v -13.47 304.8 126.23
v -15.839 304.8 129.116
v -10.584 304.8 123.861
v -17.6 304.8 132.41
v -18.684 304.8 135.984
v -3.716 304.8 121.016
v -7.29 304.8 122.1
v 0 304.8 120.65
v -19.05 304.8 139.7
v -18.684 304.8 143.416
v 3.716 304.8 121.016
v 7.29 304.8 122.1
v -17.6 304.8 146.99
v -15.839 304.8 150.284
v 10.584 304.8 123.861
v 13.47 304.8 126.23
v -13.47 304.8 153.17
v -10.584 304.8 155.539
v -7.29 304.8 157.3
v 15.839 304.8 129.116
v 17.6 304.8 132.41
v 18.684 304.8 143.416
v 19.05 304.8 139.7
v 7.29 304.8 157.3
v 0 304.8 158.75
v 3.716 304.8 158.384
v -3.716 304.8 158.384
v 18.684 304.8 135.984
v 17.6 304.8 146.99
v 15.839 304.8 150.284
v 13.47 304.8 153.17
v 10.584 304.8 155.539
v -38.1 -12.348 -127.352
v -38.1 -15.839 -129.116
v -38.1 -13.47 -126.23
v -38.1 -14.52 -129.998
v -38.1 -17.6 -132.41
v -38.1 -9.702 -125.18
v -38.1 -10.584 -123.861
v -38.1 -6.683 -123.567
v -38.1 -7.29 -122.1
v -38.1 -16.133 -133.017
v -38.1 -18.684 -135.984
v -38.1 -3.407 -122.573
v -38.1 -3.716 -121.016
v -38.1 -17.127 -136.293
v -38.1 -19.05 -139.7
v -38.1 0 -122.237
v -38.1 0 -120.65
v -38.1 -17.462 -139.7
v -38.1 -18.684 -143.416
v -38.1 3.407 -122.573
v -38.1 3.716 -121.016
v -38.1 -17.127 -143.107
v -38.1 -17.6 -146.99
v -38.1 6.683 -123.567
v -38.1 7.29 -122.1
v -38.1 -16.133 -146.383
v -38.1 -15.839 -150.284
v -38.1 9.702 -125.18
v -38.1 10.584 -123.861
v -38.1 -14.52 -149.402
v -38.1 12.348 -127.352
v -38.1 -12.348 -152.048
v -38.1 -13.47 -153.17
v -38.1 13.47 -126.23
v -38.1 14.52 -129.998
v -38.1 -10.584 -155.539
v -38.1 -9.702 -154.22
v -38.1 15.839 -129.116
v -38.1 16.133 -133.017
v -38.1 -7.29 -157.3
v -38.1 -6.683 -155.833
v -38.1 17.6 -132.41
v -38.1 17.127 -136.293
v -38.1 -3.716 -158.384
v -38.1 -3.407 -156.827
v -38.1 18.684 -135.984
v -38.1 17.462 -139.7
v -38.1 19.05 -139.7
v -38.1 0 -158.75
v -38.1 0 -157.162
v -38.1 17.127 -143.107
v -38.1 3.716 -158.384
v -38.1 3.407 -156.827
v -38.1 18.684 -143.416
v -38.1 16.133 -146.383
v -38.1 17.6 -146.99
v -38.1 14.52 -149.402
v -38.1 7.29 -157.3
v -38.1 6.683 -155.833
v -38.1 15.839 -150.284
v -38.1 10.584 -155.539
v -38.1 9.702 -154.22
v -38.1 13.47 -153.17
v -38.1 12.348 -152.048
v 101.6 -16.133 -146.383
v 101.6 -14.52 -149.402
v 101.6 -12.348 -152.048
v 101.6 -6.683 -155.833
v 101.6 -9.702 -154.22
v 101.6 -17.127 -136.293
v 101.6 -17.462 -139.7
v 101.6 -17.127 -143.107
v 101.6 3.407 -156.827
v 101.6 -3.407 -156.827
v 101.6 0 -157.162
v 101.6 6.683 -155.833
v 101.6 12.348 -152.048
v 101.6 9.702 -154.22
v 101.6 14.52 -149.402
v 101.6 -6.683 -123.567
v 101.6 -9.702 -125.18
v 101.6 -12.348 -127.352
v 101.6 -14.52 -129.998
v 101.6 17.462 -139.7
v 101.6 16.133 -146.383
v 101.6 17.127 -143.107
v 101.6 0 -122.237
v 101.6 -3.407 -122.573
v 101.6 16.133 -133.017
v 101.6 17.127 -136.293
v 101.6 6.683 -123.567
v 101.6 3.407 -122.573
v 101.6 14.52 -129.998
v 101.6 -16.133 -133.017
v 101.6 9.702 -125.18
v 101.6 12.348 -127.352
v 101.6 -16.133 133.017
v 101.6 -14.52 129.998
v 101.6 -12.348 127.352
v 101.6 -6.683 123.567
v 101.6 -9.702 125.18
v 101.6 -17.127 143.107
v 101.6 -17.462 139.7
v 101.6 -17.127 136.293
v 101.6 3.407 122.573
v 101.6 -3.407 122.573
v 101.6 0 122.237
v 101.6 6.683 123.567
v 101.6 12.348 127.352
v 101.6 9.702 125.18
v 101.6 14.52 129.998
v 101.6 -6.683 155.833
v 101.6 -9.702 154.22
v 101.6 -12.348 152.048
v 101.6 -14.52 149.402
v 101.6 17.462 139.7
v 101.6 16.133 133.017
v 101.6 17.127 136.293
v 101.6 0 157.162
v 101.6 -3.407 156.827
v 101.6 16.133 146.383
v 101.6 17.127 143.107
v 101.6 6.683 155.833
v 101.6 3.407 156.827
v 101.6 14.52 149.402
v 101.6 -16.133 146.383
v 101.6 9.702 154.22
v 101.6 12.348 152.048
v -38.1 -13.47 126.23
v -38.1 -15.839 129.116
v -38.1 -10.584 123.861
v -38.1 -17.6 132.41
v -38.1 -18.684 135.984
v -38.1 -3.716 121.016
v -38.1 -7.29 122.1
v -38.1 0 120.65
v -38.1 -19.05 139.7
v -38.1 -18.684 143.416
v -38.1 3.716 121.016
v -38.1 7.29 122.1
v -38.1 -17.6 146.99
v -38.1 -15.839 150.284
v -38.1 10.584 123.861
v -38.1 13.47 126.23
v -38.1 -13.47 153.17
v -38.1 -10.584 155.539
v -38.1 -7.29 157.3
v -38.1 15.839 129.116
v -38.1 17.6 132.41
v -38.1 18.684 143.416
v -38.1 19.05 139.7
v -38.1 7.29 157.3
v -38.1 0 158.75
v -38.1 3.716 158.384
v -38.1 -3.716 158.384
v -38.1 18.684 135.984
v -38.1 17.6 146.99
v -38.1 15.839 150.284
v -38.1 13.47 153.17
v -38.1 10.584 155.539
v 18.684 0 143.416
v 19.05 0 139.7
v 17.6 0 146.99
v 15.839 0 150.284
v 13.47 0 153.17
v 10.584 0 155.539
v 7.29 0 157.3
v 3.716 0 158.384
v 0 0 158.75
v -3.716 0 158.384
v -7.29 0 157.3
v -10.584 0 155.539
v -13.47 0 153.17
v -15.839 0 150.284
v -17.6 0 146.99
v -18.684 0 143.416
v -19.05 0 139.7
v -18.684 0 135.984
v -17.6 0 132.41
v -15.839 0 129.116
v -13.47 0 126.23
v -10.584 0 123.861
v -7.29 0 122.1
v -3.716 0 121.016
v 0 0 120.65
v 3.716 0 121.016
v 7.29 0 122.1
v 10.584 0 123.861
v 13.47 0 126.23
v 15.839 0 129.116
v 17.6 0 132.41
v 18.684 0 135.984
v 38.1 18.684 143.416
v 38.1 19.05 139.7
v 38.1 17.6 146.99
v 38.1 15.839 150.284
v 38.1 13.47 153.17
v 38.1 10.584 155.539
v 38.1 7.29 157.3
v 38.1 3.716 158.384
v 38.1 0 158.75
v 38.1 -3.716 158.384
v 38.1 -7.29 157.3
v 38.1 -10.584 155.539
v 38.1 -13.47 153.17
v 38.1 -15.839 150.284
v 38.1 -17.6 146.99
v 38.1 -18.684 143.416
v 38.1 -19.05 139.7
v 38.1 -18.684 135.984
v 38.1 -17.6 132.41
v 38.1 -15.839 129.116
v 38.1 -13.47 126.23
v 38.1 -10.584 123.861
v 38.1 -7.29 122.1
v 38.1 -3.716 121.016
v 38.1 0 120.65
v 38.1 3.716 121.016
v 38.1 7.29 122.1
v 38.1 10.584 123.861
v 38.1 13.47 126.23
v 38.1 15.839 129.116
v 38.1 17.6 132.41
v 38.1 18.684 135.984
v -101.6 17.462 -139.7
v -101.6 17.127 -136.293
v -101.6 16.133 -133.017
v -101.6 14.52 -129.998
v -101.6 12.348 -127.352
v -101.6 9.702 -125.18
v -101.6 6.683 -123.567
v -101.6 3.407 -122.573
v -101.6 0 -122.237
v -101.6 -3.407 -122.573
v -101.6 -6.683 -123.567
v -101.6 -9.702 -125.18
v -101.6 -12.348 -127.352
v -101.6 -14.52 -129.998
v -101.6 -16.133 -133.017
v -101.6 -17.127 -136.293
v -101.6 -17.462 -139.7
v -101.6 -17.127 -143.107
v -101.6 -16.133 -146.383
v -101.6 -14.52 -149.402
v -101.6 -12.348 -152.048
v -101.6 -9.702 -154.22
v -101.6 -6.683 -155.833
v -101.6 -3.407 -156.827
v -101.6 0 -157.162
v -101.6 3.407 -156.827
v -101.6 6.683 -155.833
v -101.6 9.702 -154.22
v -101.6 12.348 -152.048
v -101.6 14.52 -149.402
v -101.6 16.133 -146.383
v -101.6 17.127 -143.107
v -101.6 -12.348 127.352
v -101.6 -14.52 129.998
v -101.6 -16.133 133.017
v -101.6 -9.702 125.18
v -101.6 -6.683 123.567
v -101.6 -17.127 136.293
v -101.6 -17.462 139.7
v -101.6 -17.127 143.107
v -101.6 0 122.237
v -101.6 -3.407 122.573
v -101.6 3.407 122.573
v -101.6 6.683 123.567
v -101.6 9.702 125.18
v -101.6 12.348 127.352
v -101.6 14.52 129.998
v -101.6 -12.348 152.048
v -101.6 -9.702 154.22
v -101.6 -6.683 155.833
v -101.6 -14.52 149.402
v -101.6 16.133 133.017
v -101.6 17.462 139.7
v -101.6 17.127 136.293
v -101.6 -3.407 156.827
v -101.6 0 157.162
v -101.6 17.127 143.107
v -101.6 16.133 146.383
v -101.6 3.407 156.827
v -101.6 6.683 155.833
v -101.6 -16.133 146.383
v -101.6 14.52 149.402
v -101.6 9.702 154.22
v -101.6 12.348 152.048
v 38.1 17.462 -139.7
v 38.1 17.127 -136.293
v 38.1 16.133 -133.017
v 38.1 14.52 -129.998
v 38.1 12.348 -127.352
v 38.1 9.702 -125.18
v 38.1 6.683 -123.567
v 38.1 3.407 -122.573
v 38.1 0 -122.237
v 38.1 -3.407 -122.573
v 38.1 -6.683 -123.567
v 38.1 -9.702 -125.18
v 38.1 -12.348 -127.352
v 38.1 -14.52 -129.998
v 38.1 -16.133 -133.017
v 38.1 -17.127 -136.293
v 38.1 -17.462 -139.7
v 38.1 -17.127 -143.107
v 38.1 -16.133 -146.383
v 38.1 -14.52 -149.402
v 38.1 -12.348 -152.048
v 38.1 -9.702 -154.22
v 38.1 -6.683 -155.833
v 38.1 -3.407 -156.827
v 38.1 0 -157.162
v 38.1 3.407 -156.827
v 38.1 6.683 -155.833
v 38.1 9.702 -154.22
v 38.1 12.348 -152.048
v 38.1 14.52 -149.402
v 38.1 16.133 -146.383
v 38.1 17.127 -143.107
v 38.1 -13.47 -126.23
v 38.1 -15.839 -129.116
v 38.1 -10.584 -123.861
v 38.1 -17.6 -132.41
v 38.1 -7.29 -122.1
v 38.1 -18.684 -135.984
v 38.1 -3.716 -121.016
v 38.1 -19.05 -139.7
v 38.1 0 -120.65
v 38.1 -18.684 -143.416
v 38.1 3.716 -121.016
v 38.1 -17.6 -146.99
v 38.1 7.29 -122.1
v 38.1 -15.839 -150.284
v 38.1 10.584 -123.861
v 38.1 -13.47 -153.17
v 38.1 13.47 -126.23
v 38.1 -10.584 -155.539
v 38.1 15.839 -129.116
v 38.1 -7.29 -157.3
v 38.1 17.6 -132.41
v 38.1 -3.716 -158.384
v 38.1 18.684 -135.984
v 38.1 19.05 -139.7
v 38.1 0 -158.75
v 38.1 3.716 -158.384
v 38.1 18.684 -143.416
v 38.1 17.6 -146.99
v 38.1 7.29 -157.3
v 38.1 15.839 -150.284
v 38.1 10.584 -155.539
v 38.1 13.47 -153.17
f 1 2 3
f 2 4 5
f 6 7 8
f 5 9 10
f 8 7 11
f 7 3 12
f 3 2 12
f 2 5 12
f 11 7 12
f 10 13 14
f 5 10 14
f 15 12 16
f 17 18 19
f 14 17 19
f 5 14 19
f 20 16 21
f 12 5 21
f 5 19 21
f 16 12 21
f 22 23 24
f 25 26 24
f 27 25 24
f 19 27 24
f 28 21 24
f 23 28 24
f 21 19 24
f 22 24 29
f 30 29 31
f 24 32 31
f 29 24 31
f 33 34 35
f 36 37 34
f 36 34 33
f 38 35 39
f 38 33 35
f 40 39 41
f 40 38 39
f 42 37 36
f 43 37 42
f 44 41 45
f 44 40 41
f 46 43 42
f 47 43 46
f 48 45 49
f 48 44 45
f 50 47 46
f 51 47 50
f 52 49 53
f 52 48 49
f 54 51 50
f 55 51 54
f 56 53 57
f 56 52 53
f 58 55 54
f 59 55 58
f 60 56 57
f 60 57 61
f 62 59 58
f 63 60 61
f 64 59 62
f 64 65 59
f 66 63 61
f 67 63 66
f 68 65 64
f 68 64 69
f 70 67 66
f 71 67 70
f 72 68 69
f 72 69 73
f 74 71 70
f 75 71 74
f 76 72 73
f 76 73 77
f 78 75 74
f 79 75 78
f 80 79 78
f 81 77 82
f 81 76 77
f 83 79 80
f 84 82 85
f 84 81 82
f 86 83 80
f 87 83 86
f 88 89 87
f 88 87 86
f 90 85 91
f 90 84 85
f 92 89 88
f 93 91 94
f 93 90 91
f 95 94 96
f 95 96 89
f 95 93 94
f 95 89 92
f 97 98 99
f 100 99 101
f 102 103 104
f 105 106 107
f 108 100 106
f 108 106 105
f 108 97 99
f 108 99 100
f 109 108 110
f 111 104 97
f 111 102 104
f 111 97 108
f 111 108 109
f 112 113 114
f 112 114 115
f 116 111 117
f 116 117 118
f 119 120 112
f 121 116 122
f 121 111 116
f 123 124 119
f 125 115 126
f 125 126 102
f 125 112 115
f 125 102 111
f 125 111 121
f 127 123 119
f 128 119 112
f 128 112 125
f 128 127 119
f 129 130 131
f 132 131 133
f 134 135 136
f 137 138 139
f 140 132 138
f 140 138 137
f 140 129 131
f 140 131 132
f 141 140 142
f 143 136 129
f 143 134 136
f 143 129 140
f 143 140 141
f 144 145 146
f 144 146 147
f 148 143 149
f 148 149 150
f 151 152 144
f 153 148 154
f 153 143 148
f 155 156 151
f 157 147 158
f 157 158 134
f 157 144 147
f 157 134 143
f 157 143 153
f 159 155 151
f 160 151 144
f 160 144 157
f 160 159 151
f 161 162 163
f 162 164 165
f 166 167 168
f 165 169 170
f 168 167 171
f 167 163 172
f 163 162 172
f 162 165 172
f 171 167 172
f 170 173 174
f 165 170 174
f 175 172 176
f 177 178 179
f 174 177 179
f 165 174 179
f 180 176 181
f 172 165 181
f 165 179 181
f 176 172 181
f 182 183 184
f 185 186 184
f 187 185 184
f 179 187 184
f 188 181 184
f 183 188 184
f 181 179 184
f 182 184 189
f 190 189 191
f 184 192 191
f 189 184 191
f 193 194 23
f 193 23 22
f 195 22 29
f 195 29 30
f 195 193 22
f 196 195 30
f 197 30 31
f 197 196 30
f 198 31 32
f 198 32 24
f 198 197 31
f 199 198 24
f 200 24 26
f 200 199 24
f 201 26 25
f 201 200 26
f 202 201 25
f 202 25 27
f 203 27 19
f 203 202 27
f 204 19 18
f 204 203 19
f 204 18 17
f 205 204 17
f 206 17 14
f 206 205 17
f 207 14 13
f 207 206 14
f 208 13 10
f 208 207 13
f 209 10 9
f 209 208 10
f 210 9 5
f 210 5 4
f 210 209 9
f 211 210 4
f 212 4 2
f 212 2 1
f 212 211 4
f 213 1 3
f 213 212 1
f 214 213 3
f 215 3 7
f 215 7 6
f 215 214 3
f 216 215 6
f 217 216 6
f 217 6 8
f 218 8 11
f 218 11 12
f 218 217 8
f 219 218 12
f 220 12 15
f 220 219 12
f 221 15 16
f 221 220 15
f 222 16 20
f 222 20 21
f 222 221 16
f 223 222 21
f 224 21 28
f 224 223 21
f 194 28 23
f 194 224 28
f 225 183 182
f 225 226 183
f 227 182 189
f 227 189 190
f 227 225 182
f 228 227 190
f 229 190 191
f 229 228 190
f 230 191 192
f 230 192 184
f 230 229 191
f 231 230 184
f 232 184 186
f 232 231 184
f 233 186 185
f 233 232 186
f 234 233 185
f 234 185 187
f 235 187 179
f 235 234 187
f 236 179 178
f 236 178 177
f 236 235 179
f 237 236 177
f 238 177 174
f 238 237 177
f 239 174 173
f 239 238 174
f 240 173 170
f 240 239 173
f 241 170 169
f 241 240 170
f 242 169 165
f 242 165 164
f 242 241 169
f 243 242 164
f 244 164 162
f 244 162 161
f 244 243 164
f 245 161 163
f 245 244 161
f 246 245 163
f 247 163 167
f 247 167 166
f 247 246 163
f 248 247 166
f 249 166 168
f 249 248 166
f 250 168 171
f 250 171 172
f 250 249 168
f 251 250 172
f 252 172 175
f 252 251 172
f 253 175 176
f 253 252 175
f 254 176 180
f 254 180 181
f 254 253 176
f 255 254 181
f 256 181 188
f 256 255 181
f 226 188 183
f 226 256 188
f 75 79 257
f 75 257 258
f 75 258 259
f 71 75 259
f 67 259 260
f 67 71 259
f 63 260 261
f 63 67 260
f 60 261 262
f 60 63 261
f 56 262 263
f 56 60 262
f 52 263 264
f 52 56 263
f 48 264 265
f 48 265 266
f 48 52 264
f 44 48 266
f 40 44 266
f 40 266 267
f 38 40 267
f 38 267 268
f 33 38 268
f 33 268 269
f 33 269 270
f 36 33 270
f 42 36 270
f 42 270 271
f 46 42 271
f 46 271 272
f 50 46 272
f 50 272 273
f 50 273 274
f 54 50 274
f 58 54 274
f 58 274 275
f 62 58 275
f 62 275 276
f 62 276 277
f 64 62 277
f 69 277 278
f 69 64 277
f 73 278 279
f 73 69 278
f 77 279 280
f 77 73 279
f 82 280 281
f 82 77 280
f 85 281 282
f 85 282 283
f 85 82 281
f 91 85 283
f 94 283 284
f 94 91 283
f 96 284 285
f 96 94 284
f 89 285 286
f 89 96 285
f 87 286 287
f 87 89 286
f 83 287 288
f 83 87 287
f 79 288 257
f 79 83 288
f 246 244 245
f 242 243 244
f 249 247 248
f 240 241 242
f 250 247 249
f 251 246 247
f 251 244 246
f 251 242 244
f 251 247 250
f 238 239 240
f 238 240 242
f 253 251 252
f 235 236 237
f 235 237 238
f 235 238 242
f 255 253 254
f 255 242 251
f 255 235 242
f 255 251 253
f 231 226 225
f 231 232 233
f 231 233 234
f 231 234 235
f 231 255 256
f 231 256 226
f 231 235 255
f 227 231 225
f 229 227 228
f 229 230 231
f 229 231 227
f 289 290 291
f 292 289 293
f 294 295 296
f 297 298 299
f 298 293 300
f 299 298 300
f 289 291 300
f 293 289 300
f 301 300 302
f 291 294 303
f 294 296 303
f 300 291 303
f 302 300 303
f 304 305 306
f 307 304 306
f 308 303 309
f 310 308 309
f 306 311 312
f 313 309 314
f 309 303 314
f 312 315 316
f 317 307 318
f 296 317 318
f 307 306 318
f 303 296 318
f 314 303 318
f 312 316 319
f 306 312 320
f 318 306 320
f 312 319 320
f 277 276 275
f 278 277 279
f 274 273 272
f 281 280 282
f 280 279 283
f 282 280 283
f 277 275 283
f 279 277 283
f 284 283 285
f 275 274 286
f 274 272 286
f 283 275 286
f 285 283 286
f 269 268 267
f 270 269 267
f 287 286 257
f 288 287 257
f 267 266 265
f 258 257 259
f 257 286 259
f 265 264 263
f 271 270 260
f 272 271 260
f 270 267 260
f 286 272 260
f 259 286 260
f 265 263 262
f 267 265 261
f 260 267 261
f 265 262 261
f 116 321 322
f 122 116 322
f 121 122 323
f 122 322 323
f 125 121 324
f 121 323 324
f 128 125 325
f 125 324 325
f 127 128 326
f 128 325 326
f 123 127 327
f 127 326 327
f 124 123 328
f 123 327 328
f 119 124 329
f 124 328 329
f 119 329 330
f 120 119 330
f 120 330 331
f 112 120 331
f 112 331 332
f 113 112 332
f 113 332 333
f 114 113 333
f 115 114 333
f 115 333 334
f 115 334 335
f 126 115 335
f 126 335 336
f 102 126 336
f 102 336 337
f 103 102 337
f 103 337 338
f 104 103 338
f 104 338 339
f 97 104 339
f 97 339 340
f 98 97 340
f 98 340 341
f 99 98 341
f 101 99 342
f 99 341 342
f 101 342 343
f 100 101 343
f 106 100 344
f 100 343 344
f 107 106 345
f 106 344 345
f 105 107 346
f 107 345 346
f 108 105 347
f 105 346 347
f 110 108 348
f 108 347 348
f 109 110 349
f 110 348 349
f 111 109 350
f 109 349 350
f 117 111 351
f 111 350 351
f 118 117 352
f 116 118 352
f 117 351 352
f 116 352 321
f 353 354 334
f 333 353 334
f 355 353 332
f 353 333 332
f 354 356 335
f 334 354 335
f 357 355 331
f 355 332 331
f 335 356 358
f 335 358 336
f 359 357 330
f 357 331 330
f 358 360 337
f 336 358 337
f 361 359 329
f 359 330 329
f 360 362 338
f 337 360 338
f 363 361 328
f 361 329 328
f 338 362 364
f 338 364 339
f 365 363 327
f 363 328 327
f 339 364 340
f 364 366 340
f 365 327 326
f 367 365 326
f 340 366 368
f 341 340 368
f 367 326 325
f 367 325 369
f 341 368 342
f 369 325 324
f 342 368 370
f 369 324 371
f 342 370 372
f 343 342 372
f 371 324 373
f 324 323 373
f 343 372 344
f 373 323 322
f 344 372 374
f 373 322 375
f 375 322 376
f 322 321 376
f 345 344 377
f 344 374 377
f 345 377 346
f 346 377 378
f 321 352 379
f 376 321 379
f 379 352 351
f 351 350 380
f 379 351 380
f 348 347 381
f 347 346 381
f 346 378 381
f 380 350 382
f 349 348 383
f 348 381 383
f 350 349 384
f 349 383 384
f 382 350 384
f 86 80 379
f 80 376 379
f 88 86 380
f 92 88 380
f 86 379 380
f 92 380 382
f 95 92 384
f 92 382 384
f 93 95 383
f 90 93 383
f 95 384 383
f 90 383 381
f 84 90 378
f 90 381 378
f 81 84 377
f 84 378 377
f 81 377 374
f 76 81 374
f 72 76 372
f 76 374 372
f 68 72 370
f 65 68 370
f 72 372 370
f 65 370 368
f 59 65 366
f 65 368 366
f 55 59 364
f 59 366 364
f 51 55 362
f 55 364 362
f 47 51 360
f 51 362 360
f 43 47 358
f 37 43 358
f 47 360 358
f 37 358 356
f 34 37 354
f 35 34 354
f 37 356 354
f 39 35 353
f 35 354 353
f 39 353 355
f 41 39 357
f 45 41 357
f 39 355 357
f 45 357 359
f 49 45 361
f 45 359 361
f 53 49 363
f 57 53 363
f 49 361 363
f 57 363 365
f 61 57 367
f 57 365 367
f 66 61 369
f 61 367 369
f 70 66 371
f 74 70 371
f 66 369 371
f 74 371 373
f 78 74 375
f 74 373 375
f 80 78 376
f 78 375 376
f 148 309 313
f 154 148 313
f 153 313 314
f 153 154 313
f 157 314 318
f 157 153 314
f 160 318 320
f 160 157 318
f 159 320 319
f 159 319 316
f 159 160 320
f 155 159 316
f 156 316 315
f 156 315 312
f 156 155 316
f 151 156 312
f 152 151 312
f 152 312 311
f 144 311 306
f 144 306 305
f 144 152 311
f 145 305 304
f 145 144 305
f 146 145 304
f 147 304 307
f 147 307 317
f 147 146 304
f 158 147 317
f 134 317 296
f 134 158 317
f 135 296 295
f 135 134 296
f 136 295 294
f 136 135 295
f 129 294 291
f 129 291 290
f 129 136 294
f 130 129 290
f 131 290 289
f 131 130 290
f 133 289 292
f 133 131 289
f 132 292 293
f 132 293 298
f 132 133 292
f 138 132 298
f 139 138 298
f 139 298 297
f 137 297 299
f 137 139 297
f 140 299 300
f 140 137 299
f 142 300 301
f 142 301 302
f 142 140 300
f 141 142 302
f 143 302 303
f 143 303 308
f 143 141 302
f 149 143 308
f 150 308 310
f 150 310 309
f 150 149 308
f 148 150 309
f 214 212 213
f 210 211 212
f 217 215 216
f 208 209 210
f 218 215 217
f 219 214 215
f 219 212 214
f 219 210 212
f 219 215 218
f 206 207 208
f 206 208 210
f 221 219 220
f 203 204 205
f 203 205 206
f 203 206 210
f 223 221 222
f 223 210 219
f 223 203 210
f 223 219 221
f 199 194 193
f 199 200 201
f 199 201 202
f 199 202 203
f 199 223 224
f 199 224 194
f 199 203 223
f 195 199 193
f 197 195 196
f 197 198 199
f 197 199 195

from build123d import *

# Parameters (mm, degrees)
F0_R     = 17.4625
F1_DEPTH = 101.6
F2_R     = 19.05
F3_DEPTH = 38.1
F5_R     = 19.05
F6_DEPTH = 304.8


with BuildPart() as f1:
    # F0 (on Right) → F1 (new body, symmetric)
    with BuildSketch(Plane.YZ):
        with Locations((0, -139.7)):
            Circle(F0_R)
        with Locations((0, 139.7)):
            Circle(F0_R)
    extrude(amount=F1_DEPTH, both=True)

    # F4: F3 across plane


with BuildPart() as f3:
    # F2 (on Right) → F3 (new body, symmetric)
    with BuildSketch(Plane.YZ):
        with Locations((0, 139.7)):
            Circle(F2_R)
    extrude(amount=F3_DEPTH, both=True)


with BuildPart() as f1_1:
    add(f1.part)
    add(f3.part.mirror(Plane.XY))


with BuildPart() as f6:
    # F5 (on Front) → F6 (new body)
    with BuildSketch(Plane.XZ):
        with Locations((0, 139.7)):
            Circle(F5_R)
    extrude(amount=-F6_DEPTH)


solid = Compound([f3.part, f1_1.part, f6.part])
